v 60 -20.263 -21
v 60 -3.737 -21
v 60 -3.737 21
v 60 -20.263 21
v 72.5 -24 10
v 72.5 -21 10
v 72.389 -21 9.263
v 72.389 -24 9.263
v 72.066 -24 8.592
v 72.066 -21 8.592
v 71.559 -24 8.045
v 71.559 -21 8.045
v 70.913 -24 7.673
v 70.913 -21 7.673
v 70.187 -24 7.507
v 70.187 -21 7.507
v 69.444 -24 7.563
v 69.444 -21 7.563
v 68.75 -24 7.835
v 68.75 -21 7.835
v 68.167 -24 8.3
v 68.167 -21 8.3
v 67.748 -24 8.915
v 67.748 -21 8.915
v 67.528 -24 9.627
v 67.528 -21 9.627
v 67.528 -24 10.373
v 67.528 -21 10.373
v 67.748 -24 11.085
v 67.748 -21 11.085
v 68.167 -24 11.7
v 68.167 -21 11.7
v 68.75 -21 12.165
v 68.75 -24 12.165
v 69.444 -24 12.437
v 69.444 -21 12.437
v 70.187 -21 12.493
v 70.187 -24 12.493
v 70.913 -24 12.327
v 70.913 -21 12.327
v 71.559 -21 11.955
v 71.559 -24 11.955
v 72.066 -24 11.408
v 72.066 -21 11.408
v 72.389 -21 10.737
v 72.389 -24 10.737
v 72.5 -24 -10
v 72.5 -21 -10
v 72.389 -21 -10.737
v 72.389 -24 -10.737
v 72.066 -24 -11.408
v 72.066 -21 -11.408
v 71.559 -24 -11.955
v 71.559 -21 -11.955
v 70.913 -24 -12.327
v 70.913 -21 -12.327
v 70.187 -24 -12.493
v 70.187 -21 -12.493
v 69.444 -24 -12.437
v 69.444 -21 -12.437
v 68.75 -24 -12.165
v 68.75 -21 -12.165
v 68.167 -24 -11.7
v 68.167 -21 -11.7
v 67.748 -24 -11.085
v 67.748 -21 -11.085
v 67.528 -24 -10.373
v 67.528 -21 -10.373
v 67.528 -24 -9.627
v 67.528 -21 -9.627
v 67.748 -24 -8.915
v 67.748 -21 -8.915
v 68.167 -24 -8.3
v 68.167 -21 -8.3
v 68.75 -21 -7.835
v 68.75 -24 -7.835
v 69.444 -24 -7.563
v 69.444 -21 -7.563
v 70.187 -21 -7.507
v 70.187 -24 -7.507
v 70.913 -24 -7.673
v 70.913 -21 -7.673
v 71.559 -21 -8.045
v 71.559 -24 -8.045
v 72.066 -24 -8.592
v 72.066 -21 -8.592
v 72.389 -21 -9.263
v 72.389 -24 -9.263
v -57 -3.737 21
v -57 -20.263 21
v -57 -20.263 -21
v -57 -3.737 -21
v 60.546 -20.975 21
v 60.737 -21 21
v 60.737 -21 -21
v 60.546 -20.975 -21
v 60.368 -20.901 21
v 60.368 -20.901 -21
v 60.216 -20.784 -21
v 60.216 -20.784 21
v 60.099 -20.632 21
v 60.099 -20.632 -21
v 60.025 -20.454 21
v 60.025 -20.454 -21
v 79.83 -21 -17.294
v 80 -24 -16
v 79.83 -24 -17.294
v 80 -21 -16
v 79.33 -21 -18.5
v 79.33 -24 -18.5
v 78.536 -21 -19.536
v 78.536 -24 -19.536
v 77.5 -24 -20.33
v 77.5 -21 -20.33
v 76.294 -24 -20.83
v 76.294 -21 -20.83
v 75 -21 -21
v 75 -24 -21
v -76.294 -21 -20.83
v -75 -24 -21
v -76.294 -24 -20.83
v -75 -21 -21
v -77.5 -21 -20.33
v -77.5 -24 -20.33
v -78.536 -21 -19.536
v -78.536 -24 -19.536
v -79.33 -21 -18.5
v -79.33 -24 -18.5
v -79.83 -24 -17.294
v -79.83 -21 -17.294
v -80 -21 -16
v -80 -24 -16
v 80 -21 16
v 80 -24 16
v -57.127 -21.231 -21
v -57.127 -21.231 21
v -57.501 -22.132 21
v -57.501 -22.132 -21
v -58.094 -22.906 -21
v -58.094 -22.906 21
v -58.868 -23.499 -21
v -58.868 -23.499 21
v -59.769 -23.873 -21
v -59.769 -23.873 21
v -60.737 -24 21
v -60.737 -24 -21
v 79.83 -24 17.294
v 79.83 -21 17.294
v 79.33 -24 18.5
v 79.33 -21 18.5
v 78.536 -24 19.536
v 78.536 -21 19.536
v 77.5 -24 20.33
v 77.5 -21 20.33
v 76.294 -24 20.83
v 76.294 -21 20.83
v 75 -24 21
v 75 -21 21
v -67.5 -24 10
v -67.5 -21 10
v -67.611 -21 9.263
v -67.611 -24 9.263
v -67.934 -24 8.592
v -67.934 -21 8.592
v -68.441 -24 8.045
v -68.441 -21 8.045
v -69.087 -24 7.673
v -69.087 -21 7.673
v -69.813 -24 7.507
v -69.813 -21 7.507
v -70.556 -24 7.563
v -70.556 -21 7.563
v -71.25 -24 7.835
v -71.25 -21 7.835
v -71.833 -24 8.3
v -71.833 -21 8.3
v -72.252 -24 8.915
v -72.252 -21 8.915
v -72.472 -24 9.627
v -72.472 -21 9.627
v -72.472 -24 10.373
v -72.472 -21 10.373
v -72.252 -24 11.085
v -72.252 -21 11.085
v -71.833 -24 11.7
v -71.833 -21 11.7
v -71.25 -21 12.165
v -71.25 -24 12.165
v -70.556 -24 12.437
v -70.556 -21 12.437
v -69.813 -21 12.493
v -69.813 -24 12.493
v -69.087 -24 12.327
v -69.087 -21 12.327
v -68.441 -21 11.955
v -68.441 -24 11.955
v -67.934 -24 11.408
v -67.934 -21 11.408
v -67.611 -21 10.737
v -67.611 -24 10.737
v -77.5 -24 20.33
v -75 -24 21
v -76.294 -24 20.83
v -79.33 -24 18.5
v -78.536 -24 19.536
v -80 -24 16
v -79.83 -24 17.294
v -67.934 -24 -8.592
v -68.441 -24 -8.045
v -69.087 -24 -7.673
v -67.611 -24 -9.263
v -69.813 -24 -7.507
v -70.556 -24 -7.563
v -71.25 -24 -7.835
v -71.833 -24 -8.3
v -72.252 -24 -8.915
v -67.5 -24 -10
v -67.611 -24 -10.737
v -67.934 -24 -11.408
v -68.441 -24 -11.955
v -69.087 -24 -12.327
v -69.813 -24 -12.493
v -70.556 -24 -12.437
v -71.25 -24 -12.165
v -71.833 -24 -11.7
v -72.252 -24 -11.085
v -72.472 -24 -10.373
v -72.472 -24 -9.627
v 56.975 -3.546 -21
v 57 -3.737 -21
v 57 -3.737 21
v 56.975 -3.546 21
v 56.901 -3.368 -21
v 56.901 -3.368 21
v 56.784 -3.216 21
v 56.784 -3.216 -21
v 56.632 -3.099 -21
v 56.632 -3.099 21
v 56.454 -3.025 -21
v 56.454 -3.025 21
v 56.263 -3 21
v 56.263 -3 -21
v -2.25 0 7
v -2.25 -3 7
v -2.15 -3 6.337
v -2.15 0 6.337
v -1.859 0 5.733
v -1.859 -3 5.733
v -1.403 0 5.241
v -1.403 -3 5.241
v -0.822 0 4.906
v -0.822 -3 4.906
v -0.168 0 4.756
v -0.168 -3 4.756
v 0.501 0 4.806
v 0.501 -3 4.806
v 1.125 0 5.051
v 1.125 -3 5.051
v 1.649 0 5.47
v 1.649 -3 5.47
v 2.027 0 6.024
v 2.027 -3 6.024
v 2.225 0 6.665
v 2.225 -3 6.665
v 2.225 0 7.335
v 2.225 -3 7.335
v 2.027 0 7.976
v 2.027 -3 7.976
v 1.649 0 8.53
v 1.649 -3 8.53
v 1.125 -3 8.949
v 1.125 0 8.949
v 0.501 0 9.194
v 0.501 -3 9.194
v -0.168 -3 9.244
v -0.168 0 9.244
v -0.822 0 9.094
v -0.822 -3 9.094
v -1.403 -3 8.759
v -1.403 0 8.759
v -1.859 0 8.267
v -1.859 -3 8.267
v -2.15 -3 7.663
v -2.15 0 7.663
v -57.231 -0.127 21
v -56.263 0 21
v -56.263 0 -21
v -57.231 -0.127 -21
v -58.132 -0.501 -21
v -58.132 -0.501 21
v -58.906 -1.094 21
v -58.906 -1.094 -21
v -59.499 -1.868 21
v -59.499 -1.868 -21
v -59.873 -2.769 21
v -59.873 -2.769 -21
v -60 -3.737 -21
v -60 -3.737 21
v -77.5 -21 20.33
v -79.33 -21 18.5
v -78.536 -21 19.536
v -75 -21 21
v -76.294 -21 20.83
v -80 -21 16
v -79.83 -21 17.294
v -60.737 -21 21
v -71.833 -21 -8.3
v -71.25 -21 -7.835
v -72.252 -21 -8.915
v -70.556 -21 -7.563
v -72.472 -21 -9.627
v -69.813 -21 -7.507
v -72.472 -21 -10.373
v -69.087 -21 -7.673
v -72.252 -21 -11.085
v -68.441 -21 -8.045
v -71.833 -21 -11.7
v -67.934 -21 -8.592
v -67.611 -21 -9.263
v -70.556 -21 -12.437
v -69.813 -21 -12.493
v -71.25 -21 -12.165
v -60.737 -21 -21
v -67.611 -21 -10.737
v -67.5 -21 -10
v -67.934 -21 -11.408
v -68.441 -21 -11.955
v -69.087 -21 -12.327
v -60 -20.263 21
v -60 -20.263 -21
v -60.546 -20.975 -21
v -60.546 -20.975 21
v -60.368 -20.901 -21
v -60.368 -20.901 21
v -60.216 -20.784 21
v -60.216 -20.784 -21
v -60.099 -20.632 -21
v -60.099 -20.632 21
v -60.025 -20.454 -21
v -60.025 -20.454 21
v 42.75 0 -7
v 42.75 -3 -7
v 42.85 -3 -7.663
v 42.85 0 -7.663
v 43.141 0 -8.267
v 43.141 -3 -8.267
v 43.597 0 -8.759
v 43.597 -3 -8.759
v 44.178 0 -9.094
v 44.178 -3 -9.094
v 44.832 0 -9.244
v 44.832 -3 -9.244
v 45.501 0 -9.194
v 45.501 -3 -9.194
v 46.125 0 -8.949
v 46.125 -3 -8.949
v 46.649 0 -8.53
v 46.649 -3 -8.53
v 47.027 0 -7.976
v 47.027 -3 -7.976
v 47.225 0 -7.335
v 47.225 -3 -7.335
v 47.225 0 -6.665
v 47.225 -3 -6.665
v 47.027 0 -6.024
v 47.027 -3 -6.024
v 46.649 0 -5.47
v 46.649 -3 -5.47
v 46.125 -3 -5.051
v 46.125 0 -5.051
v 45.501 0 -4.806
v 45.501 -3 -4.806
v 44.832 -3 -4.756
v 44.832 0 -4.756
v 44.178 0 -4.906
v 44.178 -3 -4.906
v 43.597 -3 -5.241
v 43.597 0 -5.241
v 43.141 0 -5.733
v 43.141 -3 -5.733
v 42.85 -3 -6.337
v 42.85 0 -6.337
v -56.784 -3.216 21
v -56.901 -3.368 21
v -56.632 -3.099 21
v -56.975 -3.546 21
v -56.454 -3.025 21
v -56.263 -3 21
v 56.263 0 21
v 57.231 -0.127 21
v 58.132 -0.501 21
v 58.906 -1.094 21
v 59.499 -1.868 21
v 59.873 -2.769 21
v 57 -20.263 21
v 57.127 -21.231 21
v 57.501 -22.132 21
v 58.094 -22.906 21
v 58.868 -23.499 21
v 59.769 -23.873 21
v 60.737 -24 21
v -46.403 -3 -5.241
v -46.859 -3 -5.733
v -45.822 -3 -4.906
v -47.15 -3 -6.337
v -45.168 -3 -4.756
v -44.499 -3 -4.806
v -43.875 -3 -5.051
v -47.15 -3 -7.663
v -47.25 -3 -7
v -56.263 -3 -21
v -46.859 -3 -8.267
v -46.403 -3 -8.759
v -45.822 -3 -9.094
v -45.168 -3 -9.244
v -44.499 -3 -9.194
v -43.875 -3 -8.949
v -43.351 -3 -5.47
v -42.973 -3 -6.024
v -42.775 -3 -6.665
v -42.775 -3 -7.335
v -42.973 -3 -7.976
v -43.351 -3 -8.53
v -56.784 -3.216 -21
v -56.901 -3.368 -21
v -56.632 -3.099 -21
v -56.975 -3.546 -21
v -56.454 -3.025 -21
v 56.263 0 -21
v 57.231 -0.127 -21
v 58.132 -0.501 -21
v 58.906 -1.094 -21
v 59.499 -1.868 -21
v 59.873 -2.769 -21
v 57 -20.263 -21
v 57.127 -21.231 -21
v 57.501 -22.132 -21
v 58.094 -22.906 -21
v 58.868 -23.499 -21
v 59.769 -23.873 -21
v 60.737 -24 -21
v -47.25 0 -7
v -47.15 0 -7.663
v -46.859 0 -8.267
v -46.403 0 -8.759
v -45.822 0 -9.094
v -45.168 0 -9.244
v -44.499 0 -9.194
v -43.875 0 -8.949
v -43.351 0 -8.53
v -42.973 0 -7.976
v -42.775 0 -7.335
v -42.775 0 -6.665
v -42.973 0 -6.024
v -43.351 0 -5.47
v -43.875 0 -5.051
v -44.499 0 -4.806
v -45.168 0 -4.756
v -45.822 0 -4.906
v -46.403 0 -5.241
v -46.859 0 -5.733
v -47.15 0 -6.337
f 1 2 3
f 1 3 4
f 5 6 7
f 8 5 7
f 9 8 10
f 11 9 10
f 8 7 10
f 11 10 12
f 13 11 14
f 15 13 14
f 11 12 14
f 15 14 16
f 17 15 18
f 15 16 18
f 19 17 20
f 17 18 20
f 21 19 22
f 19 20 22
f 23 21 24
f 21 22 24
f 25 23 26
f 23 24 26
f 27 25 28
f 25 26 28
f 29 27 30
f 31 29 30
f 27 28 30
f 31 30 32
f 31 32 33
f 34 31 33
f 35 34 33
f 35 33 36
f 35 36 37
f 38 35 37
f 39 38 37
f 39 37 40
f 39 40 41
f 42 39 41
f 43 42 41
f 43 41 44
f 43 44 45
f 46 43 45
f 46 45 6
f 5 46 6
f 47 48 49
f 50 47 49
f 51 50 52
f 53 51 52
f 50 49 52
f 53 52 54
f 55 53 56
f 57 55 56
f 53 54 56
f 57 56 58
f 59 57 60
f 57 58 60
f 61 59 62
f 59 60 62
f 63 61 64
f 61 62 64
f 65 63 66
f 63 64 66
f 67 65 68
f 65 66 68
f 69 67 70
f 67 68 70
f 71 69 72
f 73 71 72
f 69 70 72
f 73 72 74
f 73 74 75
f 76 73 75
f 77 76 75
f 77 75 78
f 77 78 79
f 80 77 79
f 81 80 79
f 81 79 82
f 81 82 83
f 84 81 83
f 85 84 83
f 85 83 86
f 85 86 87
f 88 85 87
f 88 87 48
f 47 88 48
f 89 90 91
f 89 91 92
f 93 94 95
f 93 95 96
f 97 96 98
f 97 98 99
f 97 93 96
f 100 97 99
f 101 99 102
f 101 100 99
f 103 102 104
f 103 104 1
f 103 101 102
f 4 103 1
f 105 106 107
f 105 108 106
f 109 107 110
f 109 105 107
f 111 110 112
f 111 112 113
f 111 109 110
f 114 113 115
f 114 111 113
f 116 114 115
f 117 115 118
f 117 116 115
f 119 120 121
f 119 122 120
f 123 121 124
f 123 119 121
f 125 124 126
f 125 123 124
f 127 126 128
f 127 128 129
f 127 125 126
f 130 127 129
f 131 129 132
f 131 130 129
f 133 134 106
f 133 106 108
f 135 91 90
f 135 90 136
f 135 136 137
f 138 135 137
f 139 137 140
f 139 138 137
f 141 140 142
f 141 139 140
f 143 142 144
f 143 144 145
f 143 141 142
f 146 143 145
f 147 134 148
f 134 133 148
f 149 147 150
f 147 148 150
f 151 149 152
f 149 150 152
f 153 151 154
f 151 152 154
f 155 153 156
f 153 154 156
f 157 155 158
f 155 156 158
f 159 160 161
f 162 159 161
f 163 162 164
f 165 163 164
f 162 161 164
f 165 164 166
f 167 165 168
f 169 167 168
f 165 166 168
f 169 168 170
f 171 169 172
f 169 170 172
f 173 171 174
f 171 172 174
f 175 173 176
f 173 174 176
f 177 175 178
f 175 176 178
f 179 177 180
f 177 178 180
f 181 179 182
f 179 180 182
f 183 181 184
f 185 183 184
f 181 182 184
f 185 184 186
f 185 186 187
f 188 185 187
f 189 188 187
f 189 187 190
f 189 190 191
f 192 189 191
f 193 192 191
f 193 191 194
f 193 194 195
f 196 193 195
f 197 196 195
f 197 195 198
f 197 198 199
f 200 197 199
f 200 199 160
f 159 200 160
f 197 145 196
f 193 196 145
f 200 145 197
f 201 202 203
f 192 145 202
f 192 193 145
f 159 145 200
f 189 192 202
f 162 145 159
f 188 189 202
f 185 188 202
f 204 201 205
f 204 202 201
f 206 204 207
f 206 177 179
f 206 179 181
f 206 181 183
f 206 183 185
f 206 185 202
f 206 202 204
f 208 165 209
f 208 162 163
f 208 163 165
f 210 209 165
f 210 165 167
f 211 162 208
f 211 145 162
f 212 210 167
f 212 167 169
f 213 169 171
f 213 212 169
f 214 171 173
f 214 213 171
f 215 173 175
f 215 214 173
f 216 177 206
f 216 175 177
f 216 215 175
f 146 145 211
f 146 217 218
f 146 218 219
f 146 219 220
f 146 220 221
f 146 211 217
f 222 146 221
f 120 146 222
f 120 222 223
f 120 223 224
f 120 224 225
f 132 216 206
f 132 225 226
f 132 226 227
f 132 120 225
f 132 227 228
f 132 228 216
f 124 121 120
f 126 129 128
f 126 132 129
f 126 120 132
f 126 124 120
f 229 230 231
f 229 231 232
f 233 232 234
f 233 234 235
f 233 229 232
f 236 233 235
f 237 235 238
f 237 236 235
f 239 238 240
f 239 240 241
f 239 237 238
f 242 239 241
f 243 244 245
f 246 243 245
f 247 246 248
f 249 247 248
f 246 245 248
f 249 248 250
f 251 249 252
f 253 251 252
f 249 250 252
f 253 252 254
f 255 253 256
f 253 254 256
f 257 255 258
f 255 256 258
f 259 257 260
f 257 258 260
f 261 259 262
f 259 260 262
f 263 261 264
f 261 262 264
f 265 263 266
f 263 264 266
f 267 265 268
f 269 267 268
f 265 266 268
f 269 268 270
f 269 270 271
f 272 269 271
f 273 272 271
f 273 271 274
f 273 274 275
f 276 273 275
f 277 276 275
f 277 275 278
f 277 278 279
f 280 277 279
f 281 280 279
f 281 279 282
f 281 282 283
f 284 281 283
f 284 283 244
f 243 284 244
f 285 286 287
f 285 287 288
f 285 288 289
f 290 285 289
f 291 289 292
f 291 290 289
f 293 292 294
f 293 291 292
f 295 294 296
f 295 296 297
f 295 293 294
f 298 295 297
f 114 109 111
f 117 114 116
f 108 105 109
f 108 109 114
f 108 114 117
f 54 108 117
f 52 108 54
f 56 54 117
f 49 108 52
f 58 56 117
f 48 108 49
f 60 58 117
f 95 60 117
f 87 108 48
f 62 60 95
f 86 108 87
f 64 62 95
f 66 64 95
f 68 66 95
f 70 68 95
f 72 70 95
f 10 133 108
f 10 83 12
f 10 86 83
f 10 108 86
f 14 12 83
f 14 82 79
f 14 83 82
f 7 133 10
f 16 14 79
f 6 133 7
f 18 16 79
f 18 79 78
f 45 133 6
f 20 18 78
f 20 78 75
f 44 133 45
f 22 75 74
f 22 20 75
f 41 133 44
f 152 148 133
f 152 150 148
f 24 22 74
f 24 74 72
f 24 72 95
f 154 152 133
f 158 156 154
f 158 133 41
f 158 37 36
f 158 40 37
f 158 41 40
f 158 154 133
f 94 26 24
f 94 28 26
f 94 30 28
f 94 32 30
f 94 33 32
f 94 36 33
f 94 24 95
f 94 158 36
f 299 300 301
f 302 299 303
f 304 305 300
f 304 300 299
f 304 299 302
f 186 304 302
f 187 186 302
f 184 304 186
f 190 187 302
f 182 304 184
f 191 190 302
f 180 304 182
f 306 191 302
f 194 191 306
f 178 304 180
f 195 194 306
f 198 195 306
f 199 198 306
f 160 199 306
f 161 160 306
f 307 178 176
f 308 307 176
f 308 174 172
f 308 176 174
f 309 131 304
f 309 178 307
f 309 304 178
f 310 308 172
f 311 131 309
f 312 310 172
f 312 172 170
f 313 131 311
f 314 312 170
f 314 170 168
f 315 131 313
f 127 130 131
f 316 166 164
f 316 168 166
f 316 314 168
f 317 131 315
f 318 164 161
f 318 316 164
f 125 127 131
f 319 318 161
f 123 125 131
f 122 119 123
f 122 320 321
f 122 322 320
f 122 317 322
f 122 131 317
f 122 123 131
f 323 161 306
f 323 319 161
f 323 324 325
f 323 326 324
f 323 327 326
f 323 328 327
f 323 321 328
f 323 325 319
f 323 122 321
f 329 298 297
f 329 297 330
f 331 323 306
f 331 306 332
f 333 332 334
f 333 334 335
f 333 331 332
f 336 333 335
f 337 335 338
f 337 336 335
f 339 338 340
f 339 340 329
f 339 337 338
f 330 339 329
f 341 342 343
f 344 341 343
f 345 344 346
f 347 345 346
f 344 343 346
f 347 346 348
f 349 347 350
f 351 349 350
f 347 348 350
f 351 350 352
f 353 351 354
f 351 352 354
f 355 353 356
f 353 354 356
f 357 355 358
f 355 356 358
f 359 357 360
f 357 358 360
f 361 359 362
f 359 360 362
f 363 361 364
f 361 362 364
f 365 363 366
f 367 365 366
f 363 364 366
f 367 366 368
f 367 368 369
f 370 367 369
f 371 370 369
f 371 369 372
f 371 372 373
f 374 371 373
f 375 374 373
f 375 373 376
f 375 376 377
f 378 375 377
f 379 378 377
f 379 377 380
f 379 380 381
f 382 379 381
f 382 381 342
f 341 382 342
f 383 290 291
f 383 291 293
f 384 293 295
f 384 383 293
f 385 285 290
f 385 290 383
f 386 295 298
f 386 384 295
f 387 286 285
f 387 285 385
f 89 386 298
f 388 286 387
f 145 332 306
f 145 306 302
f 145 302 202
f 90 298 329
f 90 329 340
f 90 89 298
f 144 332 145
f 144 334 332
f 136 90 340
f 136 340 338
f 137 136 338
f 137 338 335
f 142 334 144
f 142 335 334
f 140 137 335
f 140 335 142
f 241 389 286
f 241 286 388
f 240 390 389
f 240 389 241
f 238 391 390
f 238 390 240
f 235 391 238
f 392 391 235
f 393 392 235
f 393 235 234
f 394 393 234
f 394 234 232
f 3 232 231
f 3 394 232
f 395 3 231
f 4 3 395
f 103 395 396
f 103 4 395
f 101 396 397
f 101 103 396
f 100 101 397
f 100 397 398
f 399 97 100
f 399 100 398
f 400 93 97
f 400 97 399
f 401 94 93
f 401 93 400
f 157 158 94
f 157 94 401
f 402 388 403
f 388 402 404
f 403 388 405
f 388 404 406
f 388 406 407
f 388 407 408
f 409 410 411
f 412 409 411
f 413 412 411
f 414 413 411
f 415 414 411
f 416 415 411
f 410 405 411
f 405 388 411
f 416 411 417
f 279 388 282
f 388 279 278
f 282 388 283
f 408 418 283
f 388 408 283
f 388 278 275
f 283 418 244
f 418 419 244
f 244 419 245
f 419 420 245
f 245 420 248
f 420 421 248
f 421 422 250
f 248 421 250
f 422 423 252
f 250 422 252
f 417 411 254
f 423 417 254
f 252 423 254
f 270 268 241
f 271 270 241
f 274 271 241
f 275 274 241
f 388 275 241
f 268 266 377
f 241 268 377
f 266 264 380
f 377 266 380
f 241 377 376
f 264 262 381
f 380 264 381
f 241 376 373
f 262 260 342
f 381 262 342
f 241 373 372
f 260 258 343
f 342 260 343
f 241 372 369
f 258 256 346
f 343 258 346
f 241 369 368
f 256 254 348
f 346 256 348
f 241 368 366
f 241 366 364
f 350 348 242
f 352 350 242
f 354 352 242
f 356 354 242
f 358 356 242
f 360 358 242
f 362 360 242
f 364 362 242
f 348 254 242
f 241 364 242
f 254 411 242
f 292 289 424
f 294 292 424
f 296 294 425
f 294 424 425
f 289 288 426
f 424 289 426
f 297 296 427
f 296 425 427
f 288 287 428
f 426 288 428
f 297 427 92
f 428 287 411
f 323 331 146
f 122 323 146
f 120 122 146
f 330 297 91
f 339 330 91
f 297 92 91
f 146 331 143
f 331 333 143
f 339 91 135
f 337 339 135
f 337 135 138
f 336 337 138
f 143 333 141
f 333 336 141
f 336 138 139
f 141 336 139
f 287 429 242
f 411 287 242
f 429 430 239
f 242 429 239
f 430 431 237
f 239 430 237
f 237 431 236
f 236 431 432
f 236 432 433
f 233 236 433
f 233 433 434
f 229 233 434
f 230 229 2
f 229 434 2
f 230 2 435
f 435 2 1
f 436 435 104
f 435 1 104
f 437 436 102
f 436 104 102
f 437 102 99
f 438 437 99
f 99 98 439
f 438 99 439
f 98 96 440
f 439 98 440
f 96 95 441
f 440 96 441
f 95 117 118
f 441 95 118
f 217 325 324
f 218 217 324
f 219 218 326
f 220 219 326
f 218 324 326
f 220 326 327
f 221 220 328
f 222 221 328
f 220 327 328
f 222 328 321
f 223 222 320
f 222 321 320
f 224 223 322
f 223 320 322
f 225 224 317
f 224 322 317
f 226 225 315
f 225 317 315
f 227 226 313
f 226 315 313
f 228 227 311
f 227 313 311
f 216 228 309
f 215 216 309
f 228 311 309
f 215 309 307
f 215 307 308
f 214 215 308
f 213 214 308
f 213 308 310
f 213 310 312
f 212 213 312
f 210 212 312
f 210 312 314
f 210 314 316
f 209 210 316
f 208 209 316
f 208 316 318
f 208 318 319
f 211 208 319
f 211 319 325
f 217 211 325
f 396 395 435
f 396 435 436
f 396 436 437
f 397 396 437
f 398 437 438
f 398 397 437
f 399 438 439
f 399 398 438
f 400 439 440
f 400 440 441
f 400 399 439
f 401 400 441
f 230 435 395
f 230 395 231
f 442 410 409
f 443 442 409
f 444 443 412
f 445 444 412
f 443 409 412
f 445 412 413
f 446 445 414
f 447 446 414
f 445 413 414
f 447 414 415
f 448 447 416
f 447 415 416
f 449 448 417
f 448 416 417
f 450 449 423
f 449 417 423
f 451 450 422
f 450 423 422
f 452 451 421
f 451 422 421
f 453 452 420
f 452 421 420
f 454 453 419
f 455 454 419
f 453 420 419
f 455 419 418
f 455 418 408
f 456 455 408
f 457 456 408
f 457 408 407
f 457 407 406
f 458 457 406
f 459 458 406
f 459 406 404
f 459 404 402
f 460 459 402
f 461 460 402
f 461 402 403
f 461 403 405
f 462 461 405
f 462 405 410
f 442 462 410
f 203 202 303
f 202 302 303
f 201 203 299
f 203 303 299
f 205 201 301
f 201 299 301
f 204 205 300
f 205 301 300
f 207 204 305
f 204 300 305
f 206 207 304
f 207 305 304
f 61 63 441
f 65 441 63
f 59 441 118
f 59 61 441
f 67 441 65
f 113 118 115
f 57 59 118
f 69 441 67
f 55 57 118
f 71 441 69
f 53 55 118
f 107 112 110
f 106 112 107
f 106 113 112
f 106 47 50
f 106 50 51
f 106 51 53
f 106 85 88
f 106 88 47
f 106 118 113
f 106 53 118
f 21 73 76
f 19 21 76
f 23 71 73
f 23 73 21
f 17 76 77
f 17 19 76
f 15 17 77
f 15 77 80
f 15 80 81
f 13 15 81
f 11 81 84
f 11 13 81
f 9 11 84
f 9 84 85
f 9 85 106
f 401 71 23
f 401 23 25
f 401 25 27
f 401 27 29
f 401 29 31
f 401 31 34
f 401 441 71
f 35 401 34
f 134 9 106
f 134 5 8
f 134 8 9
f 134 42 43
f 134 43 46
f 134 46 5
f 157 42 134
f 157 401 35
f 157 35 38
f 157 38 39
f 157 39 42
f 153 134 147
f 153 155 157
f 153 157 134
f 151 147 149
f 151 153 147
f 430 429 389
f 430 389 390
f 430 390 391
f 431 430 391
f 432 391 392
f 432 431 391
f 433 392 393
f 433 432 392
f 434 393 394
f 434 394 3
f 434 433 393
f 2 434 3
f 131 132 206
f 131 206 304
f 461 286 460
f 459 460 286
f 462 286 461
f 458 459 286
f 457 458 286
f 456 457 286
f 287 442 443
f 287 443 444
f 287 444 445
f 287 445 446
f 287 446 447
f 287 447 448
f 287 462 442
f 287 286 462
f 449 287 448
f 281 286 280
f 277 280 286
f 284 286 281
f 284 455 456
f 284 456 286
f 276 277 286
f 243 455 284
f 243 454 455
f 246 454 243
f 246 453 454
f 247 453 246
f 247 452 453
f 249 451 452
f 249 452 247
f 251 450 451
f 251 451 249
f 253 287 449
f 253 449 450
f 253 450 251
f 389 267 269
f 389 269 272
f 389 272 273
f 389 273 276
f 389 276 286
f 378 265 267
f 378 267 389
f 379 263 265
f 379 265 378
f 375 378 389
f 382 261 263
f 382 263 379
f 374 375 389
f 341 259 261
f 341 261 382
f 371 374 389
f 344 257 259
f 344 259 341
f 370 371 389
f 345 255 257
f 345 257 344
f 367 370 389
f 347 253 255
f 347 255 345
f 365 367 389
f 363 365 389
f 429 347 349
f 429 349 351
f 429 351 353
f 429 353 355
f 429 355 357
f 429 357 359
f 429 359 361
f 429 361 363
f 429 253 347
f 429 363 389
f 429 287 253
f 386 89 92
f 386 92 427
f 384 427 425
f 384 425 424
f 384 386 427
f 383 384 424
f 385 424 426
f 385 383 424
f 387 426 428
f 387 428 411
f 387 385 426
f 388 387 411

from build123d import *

# Parameters (mm, degrees)
SKETCH_1_W                         = 120
SKETCH_1_H                         = 42
SM_BASE_FLANGE_1_DEPTH             = 3
SM_EDGE_FLANGE_1_STRIP_W           = 13.4732
SM_EDGE_FLANGE_1_STRIP_H           = 3
SM_EDGE_FLANGE_1_STRIP_CUT_DEPTH   = 42
SM_EDGE_FLANGE_1_STRIP_2_W         = 13.4732
SM_EDGE_FLANGE_1_STRIP_2_H         = 3
SM_EDGE_FLANGE_1_STRIP_CUT_2_DEPTH = 42
SM_EDGE_FLANGE_1_DEPTH             = 42
SM_EDGE_FLANGE_1_BEND_DEPTH        = 42
SM_EDGE_FLANGE_2_STRIP_W           = 13.4732
SM_EDGE_FLANGE_2_STRIP_H           = 3
SM_EDGE_FLANGE_2_STRIP_CUT_DEPTH   = 42
SM_EDGE_FLANGE_2_STRIP_2_W         = 13.4732
SM_EDGE_FLANGE_2_STRIP_2_H         = 3
SM_EDGE_FLANGE_2_STRIP_CUT_2_DEPTH = 42
SM_EDGE_FLANGE_2_DEPTH             = 42
SM_EDGE_FLANGE_2_BEND_DEPTH        = 42
FILLET_1_R                         = 5
HOLE_WIZARD_M6_1_D                 = 5
HOLE_WIZARD_M4_1_D                 = 4.5


# Sheet-metal steps are written as plain solids
with BuildPart() as part:
    # Sketch 1 → 베이스-플랜지1 (new body)
    with BuildSketch(Plane(origin=(0, 0, 0), x_dir=(1, 0, 0), z_dir=(0, 1, 0))):
        Rectangle(SKETCH_1_W, SKETCH_1_H)
    extrude(amount=-SM_BASE_FLANGE_1_DEPTH)

    # 모서리 플랜지1 strip (across the edge) → 모서리 플랜지1 strip cut (cut)
    with BuildSketch(Plane(origin=(-60, -3, 21), x_dir=(1, 0, 0), z_dir=(0, 0, -1))):
        with Locations((-3, -1.5)):
            Rectangle(SM_EDGE_FLANGE_1_STRIP_W, SM_EDGE_FLANGE_1_STRIP_H)
    extrude(amount=SM_EDGE_FLANGE_1_STRIP_CUT_DEPTH, mode=Mode.SUBTRACT)

    # 모서리 플랜지1 strip 2 (across the edge) → 모서리 플랜지1 strip cut 2 (cut)
    with BuildSketch(Plane(origin=(60, -3, -21), x_dir=(-1, 0, 0), z_dir=(0, 0, 1))):
        with Locations((-3, -1.5)):
            Rectangle(SM_EDGE_FLANGE_1_STRIP_2_W, SM_EDGE_FLANGE_1_STRIP_2_H)
    extrude(amount=SM_EDGE_FLANGE_1_STRIP_CUT_2_DEPTH, mode=Mode.SUBTRACT)

    # 모서리 플랜지1 section (across the edge) → 모서리 플랜지1 (add)
    with BuildSketch(Plane(origin=(-60, -3, 21), x_dir=(1, 0, 0), z_dir=(0, 0, -1))):
        with BuildLine():
            Line((0, 0.7366), (0, 21))
            Line((0, 21), (3, 21))
            Line((3, 21), (3, 0.7366))
            ThreePointArc((3, 0.7366), (3.215745145, 0.215745145), (3.7366, 0))
            Line((3.7366, 0), (3.7366, -3))
            ThreePointArc((3.7366, -3), (1.094424801, -1.905575199), (0, 0.7366))
        make_face()
    extrude(amount=SM_EDGE_FLANGE_1_DEPTH)

    # 모서리 플랜지1 section 2 (across the edge) → 모서리 플랜지1 bend (add)
    with BuildSketch(Plane(origin=(60, -3, -21), x_dir=(-1, 0, 0), z_dir=(0, 0, 1))):
        with BuildLine():
            Line((0, 0.7366), (0, 21))
            Line((0, 21), (3, 21))
            Line((3, 21), (3, 0.7366))
            ThreePointArc((3, 0.7366), (3.215745145, 0.215745145), (3.7366, 0))
            Line((3.7366, 0), (3.7366, -3))
            ThreePointArc((3.7366, -3), (1.094424801, -1.905575199), (0, 0.7366))
        make_face()
    extrude(amount=SM_EDGE_FLANGE_1_BEND_DEPTH)

    # 모서리 플랜지2 strip (across the edge) → 모서리 플랜지2 strip cut (cut)
    with BuildSketch(Plane(origin=(-60, -24, -21), x_dir=(0, 1, 0), z_dir=(0, 0, 1))):
        with Locations((-3, -1.5)):
            Rectangle(SM_EDGE_FLANGE_2_STRIP_W, SM_EDGE_FLANGE_2_STRIP_H)
    extrude(amount=SM_EDGE_FLANGE_2_STRIP_CUT_DEPTH, mode=Mode.SUBTRACT)

    # 모서리 플랜지2 strip 2 (across the edge) → 모서리 플랜지2 strip cut 2 (cut)
    with BuildSketch(Plane(origin=(60, -24, 21), x_dir=(0, 1, 0), z_dir=(0, 0, -1))):
        with Locations((-3, -1.5)):
            Rectangle(SM_EDGE_FLANGE_2_STRIP_2_W, SM_EDGE_FLANGE_2_STRIP_2_H)
    extrude(amount=SM_EDGE_FLANGE_2_STRIP_CUT_2_DEPTH, mode=Mode.SUBTRACT)

    # 모서리 플랜지2 section (across the edge) → 모서리 플랜지2 (add)
    with BuildSketch(Plane(origin=(-60, -24, -21), x_dir=(0, 1, 0), z_dir=(0, 0, 1))):
        with BuildLine():
            Line((0, 0.7366), (0, 20))
            Line((0, 20), (3, 20))
            Line((3, 20), (3, 0.7366))
            ThreePointArc((3, 0.7366), (3.215745145, 0.215745145), (3.7366, 0))
            Line((3.7366, 0), (3.7366, -3))
            ThreePointArc((3.7366, -3), (1.094424801, -1.905575199), (0, 0.7366))
        make_face()
    extrude(amount=SM_EDGE_FLANGE_2_DEPTH)

    # 모서리 플랜지2 section 2 (across the edge) → 모서리 플랜지2 bend (add)
    with BuildSketch(Plane(origin=(60, -24, 21), x_dir=(0, 1, 0), z_dir=(0, 0, -1))):
        with BuildLine():
            Line((0, 0.7366), (0, 20))
            Line((0, 20), (3, 20))
            Line((3, 20), (3, 0.7366))
            ThreePointArc((3, 0.7366), (3.215745145, 0.215745145), (3.7366, 0))
            Line((3.7366, 0), (3.7366, -3))
            ThreePointArc((3.7366, -3), (1.094424801, -1.905575199), (0, 0.7366))
        make_face()
    extrude(amount=SM_EDGE_FLANGE_2_BEND_DEPTH)

    # 필렛1
    fillet_1_edges = [part.edges().sort_by_distance(p)[0] for p in [
        (-80, -22.5, -21),
        (-80, -22.5, 21),
        (80, -22.5, 21),
        (80, -22.5, -21),
    ]]
    fillet(fillet_1_edges, radius=FILLET_1_R)

    # M6 탭을 위한 탭 드릴1 (through all)
    with Locations(Plane(origin=(0, -24, 0), x_dir=(-1, 0, 0), z_dir=(0, -1, 0))):
        with Locations((-70, 10), (-70, -10), (70, 10), (70, -10)):
            Hole(HOLE_WIZARD_M6_1_D / 2)

    # M4 여유 구멍1 (through all)
    with Locations(Plane(origin=(0, 0, 0), x_dir=(1, 0, 0), z_dir=(0, 1, 0))):
        with Locations((-45, 7), (0, -7), (45, 7)):
            Hole(HOLE_WIZARD_M4_1_D / 2)


solid = part.part
